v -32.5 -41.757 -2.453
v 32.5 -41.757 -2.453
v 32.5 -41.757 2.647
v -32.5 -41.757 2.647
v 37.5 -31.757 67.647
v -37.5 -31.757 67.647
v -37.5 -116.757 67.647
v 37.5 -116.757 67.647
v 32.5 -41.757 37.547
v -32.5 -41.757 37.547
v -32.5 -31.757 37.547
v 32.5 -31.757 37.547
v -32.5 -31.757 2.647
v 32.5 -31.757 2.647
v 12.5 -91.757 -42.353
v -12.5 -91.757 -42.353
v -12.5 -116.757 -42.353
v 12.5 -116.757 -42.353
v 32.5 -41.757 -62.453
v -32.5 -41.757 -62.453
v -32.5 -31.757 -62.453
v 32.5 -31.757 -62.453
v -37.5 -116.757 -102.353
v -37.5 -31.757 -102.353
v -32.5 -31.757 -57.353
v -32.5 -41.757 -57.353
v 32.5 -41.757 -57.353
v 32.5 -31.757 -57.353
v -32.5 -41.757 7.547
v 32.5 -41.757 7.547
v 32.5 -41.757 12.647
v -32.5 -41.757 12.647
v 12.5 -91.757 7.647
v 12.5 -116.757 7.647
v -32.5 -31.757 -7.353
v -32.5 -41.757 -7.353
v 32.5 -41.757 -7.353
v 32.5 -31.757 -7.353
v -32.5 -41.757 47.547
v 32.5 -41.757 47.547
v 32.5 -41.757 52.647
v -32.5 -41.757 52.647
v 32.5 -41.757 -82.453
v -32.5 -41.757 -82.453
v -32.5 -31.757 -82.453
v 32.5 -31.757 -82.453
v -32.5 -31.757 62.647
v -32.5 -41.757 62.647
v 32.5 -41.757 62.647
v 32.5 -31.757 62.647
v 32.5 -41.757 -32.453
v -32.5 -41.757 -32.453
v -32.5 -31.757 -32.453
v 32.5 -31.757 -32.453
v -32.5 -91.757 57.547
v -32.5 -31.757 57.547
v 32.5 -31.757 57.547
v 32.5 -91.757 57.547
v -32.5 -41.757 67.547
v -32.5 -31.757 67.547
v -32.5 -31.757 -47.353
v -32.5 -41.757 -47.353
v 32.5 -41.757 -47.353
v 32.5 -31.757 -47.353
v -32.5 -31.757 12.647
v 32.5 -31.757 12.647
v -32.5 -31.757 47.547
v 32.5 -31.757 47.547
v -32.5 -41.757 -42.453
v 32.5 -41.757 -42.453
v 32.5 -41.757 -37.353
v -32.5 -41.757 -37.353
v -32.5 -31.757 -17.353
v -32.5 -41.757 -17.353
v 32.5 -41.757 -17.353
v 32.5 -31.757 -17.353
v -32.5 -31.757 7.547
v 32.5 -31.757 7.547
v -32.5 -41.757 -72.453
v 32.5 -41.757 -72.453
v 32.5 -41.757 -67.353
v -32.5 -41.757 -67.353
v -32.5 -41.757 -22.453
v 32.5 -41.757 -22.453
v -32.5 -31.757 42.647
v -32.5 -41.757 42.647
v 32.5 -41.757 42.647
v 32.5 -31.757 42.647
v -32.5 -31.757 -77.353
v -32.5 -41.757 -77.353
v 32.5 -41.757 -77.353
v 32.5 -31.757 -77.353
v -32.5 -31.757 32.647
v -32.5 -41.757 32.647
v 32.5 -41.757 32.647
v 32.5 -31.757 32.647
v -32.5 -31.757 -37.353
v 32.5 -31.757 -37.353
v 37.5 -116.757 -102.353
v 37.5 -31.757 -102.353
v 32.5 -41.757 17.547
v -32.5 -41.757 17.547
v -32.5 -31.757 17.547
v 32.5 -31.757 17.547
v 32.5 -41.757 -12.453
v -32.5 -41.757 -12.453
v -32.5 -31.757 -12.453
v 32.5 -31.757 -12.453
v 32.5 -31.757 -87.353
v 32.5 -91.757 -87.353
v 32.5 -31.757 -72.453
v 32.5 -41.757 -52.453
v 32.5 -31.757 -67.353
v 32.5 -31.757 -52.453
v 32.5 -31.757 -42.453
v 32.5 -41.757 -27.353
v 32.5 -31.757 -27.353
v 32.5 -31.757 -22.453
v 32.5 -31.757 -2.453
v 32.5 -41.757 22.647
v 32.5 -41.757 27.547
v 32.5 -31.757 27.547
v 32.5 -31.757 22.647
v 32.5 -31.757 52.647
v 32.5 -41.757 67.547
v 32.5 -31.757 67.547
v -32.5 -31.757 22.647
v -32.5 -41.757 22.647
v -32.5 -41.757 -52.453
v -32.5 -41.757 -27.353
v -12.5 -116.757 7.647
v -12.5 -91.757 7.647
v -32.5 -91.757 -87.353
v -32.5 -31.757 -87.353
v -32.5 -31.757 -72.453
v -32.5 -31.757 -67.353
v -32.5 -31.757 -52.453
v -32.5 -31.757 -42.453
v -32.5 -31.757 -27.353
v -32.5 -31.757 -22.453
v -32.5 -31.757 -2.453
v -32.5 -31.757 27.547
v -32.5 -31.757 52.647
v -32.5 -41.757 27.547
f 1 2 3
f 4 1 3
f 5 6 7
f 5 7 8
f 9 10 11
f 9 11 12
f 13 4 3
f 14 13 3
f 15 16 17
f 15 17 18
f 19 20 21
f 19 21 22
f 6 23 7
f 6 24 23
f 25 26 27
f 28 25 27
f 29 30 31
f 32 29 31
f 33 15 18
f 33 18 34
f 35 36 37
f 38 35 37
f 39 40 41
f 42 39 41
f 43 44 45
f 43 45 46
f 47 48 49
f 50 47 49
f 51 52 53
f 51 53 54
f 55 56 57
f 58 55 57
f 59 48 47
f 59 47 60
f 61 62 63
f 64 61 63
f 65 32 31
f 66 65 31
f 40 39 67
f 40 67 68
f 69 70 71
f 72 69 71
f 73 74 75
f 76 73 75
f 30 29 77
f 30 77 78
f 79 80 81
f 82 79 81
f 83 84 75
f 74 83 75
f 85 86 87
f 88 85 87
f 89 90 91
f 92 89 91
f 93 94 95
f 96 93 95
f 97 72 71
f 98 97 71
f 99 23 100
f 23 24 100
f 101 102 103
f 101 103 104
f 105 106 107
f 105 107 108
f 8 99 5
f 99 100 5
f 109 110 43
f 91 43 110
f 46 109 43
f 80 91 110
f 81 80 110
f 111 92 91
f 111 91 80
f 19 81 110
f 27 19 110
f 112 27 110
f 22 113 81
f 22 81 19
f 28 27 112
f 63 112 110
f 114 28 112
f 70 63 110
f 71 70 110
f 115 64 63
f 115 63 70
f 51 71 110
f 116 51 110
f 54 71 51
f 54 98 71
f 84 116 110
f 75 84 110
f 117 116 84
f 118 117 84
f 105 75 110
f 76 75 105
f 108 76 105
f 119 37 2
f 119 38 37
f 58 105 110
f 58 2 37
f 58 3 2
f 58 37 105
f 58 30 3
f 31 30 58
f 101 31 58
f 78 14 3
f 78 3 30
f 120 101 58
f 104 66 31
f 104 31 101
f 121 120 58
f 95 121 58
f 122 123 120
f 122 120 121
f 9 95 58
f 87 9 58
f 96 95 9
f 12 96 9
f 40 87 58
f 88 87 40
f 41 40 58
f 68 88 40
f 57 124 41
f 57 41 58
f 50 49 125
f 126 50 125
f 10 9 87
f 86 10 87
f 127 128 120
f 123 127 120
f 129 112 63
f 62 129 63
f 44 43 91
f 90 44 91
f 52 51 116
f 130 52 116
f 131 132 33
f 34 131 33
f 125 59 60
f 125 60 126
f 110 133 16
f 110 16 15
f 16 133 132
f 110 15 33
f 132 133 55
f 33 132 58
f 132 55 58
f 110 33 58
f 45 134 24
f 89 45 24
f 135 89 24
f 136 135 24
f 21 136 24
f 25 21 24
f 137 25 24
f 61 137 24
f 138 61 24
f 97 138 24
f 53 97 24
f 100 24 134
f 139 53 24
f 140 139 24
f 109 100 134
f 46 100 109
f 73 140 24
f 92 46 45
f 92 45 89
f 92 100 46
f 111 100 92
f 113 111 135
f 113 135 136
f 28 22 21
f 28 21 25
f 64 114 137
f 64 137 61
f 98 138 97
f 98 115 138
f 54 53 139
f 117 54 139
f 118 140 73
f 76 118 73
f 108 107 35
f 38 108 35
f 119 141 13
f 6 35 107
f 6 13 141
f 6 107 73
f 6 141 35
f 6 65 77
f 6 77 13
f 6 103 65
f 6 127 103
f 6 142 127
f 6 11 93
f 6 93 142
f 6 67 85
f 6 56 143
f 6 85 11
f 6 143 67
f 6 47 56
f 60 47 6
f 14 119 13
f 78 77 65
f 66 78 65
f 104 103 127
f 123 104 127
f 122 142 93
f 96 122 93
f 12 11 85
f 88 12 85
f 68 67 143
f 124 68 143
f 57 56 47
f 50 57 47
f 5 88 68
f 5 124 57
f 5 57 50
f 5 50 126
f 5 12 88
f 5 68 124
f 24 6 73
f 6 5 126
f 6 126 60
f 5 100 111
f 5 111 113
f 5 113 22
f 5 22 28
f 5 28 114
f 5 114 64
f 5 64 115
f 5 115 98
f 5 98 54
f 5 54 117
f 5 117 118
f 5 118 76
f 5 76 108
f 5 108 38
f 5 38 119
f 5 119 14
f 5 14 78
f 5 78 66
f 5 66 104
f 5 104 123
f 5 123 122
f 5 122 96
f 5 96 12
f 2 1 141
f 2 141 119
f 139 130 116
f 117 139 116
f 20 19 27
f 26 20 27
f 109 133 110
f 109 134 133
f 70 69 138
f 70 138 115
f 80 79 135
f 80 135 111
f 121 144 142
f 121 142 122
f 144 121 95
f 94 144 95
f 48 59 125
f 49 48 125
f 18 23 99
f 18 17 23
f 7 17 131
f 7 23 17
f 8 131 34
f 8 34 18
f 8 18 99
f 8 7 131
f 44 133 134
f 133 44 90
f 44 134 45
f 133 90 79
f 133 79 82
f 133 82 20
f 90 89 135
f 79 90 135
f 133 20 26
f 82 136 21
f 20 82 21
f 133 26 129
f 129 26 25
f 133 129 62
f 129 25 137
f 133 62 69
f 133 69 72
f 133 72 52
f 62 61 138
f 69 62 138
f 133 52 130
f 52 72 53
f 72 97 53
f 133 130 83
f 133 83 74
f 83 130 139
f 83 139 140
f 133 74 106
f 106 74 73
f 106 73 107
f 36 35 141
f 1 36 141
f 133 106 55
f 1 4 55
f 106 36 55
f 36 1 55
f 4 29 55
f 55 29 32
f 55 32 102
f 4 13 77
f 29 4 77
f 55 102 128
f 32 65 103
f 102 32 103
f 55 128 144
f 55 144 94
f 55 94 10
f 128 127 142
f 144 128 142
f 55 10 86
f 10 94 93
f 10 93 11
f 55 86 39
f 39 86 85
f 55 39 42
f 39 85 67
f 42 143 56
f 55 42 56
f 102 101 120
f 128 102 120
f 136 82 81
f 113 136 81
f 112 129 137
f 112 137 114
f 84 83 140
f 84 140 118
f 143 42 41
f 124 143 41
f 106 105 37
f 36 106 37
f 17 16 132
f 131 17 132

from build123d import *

# Parameters (mm, degrees)
F0_W     = 10
F0_H     = 170
F1_DEPTH = 37.5
F2_W     = 65
F2_H     = 4.9
F3_DEPTH = 10
F4_W     = 75
F4_H     = 170
F4_W_2   = 65
F4_H_2   = 144.9
F5_DEPTH = 50
F6_W     = 75
F6_H     = 170
F6_W_2   = 25
F6_H_2   = 50
F7_DEPTH = 25


with BuildPart() as f1:
    # F0 (on Right) → F1 (new body, symmetric)
    with BuildSketch(Plane.YZ):
        with Locations((-36.757313, -17.352806)):
            Rectangle(F0_W, F0_H)
    extrude(amount=F1_DEPTH, both=True)

    # F2 (on face) → F3 (cut, through all)
    with BuildSketch(Plane.XZ.offset(41.757313)):
        with Locations((0, 65.097194)):
            Rectangle(F2_W, F2_H)
        with Locations((0, 55.097194)):
            Rectangle(F2_W, F2_H)
        with Locations((0, 45.097194)):
            Rectangle(F2_W, F2_H)
        with Locations((0, 35.097194)):
            Rectangle(F2_W, F2_H)
        with Locations((0, 25.097194)):
            Rectangle(F2_W, F2_H)
        with Locations((0, 15.097194)):
            Rectangle(F2_W, F2_H)
        with Locations((0, 5.097194)):
            Rectangle(F2_W, F2_H)
        with Locations((0, -4.902806)):
            Rectangle(F2_W, F2_H)
        with Locations((0, -14.902806)):
            Rectangle(F2_W, F2_H)
        with Locations((0, -24.902806)):
            Rectangle(F2_W, F2_H)
        with Locations((0, -34.902806)):
            Rectangle(F2_W, F2_H)
        with Locations((0, -44.902806)):
            Rectangle(F2_W, F2_H)
        with Locations((0, -54.902806)):
            Rectangle(F2_W, F2_H)
        with Locations((0, -64.902806)):
            Rectangle(F2_W, F2_H)
        with Locations((0, -74.902806)):
            Rectangle(F2_W, F2_H)
        with Locations((0, -84.902806)):
            Rectangle(F2_W, F2_H)
    extrude(amount=-F3_DEPTH, mode=Mode.SUBTRACT)

    # F4 (on face) → F5 (join)
    with BuildSketch(Plane.XZ.offset(41.757313)):
        with Locations((0, -17.352806)):
            Rectangle(F4_W, F4_H)
        with Locations((0, -14.902806)):
            Rectangle(F4_W_2, F4_H_2, mode=Mode.SUBTRACT)
    extrude(amount=F5_DEPTH)

    # F6 (on face) → F7 (join)
    with BuildSketch(Plane.XZ.offset(91.757313)):
        with Locations((0, -17.352806)):
            Rectangle(F6_W, F6_H)
        with Locations((0, -17.352806)):
            Rectangle(F6_W_2, F6_H_2, mode=Mode.SUBTRACT)
    extrude(amount=F7_DEPTH)


solid = f1.part
